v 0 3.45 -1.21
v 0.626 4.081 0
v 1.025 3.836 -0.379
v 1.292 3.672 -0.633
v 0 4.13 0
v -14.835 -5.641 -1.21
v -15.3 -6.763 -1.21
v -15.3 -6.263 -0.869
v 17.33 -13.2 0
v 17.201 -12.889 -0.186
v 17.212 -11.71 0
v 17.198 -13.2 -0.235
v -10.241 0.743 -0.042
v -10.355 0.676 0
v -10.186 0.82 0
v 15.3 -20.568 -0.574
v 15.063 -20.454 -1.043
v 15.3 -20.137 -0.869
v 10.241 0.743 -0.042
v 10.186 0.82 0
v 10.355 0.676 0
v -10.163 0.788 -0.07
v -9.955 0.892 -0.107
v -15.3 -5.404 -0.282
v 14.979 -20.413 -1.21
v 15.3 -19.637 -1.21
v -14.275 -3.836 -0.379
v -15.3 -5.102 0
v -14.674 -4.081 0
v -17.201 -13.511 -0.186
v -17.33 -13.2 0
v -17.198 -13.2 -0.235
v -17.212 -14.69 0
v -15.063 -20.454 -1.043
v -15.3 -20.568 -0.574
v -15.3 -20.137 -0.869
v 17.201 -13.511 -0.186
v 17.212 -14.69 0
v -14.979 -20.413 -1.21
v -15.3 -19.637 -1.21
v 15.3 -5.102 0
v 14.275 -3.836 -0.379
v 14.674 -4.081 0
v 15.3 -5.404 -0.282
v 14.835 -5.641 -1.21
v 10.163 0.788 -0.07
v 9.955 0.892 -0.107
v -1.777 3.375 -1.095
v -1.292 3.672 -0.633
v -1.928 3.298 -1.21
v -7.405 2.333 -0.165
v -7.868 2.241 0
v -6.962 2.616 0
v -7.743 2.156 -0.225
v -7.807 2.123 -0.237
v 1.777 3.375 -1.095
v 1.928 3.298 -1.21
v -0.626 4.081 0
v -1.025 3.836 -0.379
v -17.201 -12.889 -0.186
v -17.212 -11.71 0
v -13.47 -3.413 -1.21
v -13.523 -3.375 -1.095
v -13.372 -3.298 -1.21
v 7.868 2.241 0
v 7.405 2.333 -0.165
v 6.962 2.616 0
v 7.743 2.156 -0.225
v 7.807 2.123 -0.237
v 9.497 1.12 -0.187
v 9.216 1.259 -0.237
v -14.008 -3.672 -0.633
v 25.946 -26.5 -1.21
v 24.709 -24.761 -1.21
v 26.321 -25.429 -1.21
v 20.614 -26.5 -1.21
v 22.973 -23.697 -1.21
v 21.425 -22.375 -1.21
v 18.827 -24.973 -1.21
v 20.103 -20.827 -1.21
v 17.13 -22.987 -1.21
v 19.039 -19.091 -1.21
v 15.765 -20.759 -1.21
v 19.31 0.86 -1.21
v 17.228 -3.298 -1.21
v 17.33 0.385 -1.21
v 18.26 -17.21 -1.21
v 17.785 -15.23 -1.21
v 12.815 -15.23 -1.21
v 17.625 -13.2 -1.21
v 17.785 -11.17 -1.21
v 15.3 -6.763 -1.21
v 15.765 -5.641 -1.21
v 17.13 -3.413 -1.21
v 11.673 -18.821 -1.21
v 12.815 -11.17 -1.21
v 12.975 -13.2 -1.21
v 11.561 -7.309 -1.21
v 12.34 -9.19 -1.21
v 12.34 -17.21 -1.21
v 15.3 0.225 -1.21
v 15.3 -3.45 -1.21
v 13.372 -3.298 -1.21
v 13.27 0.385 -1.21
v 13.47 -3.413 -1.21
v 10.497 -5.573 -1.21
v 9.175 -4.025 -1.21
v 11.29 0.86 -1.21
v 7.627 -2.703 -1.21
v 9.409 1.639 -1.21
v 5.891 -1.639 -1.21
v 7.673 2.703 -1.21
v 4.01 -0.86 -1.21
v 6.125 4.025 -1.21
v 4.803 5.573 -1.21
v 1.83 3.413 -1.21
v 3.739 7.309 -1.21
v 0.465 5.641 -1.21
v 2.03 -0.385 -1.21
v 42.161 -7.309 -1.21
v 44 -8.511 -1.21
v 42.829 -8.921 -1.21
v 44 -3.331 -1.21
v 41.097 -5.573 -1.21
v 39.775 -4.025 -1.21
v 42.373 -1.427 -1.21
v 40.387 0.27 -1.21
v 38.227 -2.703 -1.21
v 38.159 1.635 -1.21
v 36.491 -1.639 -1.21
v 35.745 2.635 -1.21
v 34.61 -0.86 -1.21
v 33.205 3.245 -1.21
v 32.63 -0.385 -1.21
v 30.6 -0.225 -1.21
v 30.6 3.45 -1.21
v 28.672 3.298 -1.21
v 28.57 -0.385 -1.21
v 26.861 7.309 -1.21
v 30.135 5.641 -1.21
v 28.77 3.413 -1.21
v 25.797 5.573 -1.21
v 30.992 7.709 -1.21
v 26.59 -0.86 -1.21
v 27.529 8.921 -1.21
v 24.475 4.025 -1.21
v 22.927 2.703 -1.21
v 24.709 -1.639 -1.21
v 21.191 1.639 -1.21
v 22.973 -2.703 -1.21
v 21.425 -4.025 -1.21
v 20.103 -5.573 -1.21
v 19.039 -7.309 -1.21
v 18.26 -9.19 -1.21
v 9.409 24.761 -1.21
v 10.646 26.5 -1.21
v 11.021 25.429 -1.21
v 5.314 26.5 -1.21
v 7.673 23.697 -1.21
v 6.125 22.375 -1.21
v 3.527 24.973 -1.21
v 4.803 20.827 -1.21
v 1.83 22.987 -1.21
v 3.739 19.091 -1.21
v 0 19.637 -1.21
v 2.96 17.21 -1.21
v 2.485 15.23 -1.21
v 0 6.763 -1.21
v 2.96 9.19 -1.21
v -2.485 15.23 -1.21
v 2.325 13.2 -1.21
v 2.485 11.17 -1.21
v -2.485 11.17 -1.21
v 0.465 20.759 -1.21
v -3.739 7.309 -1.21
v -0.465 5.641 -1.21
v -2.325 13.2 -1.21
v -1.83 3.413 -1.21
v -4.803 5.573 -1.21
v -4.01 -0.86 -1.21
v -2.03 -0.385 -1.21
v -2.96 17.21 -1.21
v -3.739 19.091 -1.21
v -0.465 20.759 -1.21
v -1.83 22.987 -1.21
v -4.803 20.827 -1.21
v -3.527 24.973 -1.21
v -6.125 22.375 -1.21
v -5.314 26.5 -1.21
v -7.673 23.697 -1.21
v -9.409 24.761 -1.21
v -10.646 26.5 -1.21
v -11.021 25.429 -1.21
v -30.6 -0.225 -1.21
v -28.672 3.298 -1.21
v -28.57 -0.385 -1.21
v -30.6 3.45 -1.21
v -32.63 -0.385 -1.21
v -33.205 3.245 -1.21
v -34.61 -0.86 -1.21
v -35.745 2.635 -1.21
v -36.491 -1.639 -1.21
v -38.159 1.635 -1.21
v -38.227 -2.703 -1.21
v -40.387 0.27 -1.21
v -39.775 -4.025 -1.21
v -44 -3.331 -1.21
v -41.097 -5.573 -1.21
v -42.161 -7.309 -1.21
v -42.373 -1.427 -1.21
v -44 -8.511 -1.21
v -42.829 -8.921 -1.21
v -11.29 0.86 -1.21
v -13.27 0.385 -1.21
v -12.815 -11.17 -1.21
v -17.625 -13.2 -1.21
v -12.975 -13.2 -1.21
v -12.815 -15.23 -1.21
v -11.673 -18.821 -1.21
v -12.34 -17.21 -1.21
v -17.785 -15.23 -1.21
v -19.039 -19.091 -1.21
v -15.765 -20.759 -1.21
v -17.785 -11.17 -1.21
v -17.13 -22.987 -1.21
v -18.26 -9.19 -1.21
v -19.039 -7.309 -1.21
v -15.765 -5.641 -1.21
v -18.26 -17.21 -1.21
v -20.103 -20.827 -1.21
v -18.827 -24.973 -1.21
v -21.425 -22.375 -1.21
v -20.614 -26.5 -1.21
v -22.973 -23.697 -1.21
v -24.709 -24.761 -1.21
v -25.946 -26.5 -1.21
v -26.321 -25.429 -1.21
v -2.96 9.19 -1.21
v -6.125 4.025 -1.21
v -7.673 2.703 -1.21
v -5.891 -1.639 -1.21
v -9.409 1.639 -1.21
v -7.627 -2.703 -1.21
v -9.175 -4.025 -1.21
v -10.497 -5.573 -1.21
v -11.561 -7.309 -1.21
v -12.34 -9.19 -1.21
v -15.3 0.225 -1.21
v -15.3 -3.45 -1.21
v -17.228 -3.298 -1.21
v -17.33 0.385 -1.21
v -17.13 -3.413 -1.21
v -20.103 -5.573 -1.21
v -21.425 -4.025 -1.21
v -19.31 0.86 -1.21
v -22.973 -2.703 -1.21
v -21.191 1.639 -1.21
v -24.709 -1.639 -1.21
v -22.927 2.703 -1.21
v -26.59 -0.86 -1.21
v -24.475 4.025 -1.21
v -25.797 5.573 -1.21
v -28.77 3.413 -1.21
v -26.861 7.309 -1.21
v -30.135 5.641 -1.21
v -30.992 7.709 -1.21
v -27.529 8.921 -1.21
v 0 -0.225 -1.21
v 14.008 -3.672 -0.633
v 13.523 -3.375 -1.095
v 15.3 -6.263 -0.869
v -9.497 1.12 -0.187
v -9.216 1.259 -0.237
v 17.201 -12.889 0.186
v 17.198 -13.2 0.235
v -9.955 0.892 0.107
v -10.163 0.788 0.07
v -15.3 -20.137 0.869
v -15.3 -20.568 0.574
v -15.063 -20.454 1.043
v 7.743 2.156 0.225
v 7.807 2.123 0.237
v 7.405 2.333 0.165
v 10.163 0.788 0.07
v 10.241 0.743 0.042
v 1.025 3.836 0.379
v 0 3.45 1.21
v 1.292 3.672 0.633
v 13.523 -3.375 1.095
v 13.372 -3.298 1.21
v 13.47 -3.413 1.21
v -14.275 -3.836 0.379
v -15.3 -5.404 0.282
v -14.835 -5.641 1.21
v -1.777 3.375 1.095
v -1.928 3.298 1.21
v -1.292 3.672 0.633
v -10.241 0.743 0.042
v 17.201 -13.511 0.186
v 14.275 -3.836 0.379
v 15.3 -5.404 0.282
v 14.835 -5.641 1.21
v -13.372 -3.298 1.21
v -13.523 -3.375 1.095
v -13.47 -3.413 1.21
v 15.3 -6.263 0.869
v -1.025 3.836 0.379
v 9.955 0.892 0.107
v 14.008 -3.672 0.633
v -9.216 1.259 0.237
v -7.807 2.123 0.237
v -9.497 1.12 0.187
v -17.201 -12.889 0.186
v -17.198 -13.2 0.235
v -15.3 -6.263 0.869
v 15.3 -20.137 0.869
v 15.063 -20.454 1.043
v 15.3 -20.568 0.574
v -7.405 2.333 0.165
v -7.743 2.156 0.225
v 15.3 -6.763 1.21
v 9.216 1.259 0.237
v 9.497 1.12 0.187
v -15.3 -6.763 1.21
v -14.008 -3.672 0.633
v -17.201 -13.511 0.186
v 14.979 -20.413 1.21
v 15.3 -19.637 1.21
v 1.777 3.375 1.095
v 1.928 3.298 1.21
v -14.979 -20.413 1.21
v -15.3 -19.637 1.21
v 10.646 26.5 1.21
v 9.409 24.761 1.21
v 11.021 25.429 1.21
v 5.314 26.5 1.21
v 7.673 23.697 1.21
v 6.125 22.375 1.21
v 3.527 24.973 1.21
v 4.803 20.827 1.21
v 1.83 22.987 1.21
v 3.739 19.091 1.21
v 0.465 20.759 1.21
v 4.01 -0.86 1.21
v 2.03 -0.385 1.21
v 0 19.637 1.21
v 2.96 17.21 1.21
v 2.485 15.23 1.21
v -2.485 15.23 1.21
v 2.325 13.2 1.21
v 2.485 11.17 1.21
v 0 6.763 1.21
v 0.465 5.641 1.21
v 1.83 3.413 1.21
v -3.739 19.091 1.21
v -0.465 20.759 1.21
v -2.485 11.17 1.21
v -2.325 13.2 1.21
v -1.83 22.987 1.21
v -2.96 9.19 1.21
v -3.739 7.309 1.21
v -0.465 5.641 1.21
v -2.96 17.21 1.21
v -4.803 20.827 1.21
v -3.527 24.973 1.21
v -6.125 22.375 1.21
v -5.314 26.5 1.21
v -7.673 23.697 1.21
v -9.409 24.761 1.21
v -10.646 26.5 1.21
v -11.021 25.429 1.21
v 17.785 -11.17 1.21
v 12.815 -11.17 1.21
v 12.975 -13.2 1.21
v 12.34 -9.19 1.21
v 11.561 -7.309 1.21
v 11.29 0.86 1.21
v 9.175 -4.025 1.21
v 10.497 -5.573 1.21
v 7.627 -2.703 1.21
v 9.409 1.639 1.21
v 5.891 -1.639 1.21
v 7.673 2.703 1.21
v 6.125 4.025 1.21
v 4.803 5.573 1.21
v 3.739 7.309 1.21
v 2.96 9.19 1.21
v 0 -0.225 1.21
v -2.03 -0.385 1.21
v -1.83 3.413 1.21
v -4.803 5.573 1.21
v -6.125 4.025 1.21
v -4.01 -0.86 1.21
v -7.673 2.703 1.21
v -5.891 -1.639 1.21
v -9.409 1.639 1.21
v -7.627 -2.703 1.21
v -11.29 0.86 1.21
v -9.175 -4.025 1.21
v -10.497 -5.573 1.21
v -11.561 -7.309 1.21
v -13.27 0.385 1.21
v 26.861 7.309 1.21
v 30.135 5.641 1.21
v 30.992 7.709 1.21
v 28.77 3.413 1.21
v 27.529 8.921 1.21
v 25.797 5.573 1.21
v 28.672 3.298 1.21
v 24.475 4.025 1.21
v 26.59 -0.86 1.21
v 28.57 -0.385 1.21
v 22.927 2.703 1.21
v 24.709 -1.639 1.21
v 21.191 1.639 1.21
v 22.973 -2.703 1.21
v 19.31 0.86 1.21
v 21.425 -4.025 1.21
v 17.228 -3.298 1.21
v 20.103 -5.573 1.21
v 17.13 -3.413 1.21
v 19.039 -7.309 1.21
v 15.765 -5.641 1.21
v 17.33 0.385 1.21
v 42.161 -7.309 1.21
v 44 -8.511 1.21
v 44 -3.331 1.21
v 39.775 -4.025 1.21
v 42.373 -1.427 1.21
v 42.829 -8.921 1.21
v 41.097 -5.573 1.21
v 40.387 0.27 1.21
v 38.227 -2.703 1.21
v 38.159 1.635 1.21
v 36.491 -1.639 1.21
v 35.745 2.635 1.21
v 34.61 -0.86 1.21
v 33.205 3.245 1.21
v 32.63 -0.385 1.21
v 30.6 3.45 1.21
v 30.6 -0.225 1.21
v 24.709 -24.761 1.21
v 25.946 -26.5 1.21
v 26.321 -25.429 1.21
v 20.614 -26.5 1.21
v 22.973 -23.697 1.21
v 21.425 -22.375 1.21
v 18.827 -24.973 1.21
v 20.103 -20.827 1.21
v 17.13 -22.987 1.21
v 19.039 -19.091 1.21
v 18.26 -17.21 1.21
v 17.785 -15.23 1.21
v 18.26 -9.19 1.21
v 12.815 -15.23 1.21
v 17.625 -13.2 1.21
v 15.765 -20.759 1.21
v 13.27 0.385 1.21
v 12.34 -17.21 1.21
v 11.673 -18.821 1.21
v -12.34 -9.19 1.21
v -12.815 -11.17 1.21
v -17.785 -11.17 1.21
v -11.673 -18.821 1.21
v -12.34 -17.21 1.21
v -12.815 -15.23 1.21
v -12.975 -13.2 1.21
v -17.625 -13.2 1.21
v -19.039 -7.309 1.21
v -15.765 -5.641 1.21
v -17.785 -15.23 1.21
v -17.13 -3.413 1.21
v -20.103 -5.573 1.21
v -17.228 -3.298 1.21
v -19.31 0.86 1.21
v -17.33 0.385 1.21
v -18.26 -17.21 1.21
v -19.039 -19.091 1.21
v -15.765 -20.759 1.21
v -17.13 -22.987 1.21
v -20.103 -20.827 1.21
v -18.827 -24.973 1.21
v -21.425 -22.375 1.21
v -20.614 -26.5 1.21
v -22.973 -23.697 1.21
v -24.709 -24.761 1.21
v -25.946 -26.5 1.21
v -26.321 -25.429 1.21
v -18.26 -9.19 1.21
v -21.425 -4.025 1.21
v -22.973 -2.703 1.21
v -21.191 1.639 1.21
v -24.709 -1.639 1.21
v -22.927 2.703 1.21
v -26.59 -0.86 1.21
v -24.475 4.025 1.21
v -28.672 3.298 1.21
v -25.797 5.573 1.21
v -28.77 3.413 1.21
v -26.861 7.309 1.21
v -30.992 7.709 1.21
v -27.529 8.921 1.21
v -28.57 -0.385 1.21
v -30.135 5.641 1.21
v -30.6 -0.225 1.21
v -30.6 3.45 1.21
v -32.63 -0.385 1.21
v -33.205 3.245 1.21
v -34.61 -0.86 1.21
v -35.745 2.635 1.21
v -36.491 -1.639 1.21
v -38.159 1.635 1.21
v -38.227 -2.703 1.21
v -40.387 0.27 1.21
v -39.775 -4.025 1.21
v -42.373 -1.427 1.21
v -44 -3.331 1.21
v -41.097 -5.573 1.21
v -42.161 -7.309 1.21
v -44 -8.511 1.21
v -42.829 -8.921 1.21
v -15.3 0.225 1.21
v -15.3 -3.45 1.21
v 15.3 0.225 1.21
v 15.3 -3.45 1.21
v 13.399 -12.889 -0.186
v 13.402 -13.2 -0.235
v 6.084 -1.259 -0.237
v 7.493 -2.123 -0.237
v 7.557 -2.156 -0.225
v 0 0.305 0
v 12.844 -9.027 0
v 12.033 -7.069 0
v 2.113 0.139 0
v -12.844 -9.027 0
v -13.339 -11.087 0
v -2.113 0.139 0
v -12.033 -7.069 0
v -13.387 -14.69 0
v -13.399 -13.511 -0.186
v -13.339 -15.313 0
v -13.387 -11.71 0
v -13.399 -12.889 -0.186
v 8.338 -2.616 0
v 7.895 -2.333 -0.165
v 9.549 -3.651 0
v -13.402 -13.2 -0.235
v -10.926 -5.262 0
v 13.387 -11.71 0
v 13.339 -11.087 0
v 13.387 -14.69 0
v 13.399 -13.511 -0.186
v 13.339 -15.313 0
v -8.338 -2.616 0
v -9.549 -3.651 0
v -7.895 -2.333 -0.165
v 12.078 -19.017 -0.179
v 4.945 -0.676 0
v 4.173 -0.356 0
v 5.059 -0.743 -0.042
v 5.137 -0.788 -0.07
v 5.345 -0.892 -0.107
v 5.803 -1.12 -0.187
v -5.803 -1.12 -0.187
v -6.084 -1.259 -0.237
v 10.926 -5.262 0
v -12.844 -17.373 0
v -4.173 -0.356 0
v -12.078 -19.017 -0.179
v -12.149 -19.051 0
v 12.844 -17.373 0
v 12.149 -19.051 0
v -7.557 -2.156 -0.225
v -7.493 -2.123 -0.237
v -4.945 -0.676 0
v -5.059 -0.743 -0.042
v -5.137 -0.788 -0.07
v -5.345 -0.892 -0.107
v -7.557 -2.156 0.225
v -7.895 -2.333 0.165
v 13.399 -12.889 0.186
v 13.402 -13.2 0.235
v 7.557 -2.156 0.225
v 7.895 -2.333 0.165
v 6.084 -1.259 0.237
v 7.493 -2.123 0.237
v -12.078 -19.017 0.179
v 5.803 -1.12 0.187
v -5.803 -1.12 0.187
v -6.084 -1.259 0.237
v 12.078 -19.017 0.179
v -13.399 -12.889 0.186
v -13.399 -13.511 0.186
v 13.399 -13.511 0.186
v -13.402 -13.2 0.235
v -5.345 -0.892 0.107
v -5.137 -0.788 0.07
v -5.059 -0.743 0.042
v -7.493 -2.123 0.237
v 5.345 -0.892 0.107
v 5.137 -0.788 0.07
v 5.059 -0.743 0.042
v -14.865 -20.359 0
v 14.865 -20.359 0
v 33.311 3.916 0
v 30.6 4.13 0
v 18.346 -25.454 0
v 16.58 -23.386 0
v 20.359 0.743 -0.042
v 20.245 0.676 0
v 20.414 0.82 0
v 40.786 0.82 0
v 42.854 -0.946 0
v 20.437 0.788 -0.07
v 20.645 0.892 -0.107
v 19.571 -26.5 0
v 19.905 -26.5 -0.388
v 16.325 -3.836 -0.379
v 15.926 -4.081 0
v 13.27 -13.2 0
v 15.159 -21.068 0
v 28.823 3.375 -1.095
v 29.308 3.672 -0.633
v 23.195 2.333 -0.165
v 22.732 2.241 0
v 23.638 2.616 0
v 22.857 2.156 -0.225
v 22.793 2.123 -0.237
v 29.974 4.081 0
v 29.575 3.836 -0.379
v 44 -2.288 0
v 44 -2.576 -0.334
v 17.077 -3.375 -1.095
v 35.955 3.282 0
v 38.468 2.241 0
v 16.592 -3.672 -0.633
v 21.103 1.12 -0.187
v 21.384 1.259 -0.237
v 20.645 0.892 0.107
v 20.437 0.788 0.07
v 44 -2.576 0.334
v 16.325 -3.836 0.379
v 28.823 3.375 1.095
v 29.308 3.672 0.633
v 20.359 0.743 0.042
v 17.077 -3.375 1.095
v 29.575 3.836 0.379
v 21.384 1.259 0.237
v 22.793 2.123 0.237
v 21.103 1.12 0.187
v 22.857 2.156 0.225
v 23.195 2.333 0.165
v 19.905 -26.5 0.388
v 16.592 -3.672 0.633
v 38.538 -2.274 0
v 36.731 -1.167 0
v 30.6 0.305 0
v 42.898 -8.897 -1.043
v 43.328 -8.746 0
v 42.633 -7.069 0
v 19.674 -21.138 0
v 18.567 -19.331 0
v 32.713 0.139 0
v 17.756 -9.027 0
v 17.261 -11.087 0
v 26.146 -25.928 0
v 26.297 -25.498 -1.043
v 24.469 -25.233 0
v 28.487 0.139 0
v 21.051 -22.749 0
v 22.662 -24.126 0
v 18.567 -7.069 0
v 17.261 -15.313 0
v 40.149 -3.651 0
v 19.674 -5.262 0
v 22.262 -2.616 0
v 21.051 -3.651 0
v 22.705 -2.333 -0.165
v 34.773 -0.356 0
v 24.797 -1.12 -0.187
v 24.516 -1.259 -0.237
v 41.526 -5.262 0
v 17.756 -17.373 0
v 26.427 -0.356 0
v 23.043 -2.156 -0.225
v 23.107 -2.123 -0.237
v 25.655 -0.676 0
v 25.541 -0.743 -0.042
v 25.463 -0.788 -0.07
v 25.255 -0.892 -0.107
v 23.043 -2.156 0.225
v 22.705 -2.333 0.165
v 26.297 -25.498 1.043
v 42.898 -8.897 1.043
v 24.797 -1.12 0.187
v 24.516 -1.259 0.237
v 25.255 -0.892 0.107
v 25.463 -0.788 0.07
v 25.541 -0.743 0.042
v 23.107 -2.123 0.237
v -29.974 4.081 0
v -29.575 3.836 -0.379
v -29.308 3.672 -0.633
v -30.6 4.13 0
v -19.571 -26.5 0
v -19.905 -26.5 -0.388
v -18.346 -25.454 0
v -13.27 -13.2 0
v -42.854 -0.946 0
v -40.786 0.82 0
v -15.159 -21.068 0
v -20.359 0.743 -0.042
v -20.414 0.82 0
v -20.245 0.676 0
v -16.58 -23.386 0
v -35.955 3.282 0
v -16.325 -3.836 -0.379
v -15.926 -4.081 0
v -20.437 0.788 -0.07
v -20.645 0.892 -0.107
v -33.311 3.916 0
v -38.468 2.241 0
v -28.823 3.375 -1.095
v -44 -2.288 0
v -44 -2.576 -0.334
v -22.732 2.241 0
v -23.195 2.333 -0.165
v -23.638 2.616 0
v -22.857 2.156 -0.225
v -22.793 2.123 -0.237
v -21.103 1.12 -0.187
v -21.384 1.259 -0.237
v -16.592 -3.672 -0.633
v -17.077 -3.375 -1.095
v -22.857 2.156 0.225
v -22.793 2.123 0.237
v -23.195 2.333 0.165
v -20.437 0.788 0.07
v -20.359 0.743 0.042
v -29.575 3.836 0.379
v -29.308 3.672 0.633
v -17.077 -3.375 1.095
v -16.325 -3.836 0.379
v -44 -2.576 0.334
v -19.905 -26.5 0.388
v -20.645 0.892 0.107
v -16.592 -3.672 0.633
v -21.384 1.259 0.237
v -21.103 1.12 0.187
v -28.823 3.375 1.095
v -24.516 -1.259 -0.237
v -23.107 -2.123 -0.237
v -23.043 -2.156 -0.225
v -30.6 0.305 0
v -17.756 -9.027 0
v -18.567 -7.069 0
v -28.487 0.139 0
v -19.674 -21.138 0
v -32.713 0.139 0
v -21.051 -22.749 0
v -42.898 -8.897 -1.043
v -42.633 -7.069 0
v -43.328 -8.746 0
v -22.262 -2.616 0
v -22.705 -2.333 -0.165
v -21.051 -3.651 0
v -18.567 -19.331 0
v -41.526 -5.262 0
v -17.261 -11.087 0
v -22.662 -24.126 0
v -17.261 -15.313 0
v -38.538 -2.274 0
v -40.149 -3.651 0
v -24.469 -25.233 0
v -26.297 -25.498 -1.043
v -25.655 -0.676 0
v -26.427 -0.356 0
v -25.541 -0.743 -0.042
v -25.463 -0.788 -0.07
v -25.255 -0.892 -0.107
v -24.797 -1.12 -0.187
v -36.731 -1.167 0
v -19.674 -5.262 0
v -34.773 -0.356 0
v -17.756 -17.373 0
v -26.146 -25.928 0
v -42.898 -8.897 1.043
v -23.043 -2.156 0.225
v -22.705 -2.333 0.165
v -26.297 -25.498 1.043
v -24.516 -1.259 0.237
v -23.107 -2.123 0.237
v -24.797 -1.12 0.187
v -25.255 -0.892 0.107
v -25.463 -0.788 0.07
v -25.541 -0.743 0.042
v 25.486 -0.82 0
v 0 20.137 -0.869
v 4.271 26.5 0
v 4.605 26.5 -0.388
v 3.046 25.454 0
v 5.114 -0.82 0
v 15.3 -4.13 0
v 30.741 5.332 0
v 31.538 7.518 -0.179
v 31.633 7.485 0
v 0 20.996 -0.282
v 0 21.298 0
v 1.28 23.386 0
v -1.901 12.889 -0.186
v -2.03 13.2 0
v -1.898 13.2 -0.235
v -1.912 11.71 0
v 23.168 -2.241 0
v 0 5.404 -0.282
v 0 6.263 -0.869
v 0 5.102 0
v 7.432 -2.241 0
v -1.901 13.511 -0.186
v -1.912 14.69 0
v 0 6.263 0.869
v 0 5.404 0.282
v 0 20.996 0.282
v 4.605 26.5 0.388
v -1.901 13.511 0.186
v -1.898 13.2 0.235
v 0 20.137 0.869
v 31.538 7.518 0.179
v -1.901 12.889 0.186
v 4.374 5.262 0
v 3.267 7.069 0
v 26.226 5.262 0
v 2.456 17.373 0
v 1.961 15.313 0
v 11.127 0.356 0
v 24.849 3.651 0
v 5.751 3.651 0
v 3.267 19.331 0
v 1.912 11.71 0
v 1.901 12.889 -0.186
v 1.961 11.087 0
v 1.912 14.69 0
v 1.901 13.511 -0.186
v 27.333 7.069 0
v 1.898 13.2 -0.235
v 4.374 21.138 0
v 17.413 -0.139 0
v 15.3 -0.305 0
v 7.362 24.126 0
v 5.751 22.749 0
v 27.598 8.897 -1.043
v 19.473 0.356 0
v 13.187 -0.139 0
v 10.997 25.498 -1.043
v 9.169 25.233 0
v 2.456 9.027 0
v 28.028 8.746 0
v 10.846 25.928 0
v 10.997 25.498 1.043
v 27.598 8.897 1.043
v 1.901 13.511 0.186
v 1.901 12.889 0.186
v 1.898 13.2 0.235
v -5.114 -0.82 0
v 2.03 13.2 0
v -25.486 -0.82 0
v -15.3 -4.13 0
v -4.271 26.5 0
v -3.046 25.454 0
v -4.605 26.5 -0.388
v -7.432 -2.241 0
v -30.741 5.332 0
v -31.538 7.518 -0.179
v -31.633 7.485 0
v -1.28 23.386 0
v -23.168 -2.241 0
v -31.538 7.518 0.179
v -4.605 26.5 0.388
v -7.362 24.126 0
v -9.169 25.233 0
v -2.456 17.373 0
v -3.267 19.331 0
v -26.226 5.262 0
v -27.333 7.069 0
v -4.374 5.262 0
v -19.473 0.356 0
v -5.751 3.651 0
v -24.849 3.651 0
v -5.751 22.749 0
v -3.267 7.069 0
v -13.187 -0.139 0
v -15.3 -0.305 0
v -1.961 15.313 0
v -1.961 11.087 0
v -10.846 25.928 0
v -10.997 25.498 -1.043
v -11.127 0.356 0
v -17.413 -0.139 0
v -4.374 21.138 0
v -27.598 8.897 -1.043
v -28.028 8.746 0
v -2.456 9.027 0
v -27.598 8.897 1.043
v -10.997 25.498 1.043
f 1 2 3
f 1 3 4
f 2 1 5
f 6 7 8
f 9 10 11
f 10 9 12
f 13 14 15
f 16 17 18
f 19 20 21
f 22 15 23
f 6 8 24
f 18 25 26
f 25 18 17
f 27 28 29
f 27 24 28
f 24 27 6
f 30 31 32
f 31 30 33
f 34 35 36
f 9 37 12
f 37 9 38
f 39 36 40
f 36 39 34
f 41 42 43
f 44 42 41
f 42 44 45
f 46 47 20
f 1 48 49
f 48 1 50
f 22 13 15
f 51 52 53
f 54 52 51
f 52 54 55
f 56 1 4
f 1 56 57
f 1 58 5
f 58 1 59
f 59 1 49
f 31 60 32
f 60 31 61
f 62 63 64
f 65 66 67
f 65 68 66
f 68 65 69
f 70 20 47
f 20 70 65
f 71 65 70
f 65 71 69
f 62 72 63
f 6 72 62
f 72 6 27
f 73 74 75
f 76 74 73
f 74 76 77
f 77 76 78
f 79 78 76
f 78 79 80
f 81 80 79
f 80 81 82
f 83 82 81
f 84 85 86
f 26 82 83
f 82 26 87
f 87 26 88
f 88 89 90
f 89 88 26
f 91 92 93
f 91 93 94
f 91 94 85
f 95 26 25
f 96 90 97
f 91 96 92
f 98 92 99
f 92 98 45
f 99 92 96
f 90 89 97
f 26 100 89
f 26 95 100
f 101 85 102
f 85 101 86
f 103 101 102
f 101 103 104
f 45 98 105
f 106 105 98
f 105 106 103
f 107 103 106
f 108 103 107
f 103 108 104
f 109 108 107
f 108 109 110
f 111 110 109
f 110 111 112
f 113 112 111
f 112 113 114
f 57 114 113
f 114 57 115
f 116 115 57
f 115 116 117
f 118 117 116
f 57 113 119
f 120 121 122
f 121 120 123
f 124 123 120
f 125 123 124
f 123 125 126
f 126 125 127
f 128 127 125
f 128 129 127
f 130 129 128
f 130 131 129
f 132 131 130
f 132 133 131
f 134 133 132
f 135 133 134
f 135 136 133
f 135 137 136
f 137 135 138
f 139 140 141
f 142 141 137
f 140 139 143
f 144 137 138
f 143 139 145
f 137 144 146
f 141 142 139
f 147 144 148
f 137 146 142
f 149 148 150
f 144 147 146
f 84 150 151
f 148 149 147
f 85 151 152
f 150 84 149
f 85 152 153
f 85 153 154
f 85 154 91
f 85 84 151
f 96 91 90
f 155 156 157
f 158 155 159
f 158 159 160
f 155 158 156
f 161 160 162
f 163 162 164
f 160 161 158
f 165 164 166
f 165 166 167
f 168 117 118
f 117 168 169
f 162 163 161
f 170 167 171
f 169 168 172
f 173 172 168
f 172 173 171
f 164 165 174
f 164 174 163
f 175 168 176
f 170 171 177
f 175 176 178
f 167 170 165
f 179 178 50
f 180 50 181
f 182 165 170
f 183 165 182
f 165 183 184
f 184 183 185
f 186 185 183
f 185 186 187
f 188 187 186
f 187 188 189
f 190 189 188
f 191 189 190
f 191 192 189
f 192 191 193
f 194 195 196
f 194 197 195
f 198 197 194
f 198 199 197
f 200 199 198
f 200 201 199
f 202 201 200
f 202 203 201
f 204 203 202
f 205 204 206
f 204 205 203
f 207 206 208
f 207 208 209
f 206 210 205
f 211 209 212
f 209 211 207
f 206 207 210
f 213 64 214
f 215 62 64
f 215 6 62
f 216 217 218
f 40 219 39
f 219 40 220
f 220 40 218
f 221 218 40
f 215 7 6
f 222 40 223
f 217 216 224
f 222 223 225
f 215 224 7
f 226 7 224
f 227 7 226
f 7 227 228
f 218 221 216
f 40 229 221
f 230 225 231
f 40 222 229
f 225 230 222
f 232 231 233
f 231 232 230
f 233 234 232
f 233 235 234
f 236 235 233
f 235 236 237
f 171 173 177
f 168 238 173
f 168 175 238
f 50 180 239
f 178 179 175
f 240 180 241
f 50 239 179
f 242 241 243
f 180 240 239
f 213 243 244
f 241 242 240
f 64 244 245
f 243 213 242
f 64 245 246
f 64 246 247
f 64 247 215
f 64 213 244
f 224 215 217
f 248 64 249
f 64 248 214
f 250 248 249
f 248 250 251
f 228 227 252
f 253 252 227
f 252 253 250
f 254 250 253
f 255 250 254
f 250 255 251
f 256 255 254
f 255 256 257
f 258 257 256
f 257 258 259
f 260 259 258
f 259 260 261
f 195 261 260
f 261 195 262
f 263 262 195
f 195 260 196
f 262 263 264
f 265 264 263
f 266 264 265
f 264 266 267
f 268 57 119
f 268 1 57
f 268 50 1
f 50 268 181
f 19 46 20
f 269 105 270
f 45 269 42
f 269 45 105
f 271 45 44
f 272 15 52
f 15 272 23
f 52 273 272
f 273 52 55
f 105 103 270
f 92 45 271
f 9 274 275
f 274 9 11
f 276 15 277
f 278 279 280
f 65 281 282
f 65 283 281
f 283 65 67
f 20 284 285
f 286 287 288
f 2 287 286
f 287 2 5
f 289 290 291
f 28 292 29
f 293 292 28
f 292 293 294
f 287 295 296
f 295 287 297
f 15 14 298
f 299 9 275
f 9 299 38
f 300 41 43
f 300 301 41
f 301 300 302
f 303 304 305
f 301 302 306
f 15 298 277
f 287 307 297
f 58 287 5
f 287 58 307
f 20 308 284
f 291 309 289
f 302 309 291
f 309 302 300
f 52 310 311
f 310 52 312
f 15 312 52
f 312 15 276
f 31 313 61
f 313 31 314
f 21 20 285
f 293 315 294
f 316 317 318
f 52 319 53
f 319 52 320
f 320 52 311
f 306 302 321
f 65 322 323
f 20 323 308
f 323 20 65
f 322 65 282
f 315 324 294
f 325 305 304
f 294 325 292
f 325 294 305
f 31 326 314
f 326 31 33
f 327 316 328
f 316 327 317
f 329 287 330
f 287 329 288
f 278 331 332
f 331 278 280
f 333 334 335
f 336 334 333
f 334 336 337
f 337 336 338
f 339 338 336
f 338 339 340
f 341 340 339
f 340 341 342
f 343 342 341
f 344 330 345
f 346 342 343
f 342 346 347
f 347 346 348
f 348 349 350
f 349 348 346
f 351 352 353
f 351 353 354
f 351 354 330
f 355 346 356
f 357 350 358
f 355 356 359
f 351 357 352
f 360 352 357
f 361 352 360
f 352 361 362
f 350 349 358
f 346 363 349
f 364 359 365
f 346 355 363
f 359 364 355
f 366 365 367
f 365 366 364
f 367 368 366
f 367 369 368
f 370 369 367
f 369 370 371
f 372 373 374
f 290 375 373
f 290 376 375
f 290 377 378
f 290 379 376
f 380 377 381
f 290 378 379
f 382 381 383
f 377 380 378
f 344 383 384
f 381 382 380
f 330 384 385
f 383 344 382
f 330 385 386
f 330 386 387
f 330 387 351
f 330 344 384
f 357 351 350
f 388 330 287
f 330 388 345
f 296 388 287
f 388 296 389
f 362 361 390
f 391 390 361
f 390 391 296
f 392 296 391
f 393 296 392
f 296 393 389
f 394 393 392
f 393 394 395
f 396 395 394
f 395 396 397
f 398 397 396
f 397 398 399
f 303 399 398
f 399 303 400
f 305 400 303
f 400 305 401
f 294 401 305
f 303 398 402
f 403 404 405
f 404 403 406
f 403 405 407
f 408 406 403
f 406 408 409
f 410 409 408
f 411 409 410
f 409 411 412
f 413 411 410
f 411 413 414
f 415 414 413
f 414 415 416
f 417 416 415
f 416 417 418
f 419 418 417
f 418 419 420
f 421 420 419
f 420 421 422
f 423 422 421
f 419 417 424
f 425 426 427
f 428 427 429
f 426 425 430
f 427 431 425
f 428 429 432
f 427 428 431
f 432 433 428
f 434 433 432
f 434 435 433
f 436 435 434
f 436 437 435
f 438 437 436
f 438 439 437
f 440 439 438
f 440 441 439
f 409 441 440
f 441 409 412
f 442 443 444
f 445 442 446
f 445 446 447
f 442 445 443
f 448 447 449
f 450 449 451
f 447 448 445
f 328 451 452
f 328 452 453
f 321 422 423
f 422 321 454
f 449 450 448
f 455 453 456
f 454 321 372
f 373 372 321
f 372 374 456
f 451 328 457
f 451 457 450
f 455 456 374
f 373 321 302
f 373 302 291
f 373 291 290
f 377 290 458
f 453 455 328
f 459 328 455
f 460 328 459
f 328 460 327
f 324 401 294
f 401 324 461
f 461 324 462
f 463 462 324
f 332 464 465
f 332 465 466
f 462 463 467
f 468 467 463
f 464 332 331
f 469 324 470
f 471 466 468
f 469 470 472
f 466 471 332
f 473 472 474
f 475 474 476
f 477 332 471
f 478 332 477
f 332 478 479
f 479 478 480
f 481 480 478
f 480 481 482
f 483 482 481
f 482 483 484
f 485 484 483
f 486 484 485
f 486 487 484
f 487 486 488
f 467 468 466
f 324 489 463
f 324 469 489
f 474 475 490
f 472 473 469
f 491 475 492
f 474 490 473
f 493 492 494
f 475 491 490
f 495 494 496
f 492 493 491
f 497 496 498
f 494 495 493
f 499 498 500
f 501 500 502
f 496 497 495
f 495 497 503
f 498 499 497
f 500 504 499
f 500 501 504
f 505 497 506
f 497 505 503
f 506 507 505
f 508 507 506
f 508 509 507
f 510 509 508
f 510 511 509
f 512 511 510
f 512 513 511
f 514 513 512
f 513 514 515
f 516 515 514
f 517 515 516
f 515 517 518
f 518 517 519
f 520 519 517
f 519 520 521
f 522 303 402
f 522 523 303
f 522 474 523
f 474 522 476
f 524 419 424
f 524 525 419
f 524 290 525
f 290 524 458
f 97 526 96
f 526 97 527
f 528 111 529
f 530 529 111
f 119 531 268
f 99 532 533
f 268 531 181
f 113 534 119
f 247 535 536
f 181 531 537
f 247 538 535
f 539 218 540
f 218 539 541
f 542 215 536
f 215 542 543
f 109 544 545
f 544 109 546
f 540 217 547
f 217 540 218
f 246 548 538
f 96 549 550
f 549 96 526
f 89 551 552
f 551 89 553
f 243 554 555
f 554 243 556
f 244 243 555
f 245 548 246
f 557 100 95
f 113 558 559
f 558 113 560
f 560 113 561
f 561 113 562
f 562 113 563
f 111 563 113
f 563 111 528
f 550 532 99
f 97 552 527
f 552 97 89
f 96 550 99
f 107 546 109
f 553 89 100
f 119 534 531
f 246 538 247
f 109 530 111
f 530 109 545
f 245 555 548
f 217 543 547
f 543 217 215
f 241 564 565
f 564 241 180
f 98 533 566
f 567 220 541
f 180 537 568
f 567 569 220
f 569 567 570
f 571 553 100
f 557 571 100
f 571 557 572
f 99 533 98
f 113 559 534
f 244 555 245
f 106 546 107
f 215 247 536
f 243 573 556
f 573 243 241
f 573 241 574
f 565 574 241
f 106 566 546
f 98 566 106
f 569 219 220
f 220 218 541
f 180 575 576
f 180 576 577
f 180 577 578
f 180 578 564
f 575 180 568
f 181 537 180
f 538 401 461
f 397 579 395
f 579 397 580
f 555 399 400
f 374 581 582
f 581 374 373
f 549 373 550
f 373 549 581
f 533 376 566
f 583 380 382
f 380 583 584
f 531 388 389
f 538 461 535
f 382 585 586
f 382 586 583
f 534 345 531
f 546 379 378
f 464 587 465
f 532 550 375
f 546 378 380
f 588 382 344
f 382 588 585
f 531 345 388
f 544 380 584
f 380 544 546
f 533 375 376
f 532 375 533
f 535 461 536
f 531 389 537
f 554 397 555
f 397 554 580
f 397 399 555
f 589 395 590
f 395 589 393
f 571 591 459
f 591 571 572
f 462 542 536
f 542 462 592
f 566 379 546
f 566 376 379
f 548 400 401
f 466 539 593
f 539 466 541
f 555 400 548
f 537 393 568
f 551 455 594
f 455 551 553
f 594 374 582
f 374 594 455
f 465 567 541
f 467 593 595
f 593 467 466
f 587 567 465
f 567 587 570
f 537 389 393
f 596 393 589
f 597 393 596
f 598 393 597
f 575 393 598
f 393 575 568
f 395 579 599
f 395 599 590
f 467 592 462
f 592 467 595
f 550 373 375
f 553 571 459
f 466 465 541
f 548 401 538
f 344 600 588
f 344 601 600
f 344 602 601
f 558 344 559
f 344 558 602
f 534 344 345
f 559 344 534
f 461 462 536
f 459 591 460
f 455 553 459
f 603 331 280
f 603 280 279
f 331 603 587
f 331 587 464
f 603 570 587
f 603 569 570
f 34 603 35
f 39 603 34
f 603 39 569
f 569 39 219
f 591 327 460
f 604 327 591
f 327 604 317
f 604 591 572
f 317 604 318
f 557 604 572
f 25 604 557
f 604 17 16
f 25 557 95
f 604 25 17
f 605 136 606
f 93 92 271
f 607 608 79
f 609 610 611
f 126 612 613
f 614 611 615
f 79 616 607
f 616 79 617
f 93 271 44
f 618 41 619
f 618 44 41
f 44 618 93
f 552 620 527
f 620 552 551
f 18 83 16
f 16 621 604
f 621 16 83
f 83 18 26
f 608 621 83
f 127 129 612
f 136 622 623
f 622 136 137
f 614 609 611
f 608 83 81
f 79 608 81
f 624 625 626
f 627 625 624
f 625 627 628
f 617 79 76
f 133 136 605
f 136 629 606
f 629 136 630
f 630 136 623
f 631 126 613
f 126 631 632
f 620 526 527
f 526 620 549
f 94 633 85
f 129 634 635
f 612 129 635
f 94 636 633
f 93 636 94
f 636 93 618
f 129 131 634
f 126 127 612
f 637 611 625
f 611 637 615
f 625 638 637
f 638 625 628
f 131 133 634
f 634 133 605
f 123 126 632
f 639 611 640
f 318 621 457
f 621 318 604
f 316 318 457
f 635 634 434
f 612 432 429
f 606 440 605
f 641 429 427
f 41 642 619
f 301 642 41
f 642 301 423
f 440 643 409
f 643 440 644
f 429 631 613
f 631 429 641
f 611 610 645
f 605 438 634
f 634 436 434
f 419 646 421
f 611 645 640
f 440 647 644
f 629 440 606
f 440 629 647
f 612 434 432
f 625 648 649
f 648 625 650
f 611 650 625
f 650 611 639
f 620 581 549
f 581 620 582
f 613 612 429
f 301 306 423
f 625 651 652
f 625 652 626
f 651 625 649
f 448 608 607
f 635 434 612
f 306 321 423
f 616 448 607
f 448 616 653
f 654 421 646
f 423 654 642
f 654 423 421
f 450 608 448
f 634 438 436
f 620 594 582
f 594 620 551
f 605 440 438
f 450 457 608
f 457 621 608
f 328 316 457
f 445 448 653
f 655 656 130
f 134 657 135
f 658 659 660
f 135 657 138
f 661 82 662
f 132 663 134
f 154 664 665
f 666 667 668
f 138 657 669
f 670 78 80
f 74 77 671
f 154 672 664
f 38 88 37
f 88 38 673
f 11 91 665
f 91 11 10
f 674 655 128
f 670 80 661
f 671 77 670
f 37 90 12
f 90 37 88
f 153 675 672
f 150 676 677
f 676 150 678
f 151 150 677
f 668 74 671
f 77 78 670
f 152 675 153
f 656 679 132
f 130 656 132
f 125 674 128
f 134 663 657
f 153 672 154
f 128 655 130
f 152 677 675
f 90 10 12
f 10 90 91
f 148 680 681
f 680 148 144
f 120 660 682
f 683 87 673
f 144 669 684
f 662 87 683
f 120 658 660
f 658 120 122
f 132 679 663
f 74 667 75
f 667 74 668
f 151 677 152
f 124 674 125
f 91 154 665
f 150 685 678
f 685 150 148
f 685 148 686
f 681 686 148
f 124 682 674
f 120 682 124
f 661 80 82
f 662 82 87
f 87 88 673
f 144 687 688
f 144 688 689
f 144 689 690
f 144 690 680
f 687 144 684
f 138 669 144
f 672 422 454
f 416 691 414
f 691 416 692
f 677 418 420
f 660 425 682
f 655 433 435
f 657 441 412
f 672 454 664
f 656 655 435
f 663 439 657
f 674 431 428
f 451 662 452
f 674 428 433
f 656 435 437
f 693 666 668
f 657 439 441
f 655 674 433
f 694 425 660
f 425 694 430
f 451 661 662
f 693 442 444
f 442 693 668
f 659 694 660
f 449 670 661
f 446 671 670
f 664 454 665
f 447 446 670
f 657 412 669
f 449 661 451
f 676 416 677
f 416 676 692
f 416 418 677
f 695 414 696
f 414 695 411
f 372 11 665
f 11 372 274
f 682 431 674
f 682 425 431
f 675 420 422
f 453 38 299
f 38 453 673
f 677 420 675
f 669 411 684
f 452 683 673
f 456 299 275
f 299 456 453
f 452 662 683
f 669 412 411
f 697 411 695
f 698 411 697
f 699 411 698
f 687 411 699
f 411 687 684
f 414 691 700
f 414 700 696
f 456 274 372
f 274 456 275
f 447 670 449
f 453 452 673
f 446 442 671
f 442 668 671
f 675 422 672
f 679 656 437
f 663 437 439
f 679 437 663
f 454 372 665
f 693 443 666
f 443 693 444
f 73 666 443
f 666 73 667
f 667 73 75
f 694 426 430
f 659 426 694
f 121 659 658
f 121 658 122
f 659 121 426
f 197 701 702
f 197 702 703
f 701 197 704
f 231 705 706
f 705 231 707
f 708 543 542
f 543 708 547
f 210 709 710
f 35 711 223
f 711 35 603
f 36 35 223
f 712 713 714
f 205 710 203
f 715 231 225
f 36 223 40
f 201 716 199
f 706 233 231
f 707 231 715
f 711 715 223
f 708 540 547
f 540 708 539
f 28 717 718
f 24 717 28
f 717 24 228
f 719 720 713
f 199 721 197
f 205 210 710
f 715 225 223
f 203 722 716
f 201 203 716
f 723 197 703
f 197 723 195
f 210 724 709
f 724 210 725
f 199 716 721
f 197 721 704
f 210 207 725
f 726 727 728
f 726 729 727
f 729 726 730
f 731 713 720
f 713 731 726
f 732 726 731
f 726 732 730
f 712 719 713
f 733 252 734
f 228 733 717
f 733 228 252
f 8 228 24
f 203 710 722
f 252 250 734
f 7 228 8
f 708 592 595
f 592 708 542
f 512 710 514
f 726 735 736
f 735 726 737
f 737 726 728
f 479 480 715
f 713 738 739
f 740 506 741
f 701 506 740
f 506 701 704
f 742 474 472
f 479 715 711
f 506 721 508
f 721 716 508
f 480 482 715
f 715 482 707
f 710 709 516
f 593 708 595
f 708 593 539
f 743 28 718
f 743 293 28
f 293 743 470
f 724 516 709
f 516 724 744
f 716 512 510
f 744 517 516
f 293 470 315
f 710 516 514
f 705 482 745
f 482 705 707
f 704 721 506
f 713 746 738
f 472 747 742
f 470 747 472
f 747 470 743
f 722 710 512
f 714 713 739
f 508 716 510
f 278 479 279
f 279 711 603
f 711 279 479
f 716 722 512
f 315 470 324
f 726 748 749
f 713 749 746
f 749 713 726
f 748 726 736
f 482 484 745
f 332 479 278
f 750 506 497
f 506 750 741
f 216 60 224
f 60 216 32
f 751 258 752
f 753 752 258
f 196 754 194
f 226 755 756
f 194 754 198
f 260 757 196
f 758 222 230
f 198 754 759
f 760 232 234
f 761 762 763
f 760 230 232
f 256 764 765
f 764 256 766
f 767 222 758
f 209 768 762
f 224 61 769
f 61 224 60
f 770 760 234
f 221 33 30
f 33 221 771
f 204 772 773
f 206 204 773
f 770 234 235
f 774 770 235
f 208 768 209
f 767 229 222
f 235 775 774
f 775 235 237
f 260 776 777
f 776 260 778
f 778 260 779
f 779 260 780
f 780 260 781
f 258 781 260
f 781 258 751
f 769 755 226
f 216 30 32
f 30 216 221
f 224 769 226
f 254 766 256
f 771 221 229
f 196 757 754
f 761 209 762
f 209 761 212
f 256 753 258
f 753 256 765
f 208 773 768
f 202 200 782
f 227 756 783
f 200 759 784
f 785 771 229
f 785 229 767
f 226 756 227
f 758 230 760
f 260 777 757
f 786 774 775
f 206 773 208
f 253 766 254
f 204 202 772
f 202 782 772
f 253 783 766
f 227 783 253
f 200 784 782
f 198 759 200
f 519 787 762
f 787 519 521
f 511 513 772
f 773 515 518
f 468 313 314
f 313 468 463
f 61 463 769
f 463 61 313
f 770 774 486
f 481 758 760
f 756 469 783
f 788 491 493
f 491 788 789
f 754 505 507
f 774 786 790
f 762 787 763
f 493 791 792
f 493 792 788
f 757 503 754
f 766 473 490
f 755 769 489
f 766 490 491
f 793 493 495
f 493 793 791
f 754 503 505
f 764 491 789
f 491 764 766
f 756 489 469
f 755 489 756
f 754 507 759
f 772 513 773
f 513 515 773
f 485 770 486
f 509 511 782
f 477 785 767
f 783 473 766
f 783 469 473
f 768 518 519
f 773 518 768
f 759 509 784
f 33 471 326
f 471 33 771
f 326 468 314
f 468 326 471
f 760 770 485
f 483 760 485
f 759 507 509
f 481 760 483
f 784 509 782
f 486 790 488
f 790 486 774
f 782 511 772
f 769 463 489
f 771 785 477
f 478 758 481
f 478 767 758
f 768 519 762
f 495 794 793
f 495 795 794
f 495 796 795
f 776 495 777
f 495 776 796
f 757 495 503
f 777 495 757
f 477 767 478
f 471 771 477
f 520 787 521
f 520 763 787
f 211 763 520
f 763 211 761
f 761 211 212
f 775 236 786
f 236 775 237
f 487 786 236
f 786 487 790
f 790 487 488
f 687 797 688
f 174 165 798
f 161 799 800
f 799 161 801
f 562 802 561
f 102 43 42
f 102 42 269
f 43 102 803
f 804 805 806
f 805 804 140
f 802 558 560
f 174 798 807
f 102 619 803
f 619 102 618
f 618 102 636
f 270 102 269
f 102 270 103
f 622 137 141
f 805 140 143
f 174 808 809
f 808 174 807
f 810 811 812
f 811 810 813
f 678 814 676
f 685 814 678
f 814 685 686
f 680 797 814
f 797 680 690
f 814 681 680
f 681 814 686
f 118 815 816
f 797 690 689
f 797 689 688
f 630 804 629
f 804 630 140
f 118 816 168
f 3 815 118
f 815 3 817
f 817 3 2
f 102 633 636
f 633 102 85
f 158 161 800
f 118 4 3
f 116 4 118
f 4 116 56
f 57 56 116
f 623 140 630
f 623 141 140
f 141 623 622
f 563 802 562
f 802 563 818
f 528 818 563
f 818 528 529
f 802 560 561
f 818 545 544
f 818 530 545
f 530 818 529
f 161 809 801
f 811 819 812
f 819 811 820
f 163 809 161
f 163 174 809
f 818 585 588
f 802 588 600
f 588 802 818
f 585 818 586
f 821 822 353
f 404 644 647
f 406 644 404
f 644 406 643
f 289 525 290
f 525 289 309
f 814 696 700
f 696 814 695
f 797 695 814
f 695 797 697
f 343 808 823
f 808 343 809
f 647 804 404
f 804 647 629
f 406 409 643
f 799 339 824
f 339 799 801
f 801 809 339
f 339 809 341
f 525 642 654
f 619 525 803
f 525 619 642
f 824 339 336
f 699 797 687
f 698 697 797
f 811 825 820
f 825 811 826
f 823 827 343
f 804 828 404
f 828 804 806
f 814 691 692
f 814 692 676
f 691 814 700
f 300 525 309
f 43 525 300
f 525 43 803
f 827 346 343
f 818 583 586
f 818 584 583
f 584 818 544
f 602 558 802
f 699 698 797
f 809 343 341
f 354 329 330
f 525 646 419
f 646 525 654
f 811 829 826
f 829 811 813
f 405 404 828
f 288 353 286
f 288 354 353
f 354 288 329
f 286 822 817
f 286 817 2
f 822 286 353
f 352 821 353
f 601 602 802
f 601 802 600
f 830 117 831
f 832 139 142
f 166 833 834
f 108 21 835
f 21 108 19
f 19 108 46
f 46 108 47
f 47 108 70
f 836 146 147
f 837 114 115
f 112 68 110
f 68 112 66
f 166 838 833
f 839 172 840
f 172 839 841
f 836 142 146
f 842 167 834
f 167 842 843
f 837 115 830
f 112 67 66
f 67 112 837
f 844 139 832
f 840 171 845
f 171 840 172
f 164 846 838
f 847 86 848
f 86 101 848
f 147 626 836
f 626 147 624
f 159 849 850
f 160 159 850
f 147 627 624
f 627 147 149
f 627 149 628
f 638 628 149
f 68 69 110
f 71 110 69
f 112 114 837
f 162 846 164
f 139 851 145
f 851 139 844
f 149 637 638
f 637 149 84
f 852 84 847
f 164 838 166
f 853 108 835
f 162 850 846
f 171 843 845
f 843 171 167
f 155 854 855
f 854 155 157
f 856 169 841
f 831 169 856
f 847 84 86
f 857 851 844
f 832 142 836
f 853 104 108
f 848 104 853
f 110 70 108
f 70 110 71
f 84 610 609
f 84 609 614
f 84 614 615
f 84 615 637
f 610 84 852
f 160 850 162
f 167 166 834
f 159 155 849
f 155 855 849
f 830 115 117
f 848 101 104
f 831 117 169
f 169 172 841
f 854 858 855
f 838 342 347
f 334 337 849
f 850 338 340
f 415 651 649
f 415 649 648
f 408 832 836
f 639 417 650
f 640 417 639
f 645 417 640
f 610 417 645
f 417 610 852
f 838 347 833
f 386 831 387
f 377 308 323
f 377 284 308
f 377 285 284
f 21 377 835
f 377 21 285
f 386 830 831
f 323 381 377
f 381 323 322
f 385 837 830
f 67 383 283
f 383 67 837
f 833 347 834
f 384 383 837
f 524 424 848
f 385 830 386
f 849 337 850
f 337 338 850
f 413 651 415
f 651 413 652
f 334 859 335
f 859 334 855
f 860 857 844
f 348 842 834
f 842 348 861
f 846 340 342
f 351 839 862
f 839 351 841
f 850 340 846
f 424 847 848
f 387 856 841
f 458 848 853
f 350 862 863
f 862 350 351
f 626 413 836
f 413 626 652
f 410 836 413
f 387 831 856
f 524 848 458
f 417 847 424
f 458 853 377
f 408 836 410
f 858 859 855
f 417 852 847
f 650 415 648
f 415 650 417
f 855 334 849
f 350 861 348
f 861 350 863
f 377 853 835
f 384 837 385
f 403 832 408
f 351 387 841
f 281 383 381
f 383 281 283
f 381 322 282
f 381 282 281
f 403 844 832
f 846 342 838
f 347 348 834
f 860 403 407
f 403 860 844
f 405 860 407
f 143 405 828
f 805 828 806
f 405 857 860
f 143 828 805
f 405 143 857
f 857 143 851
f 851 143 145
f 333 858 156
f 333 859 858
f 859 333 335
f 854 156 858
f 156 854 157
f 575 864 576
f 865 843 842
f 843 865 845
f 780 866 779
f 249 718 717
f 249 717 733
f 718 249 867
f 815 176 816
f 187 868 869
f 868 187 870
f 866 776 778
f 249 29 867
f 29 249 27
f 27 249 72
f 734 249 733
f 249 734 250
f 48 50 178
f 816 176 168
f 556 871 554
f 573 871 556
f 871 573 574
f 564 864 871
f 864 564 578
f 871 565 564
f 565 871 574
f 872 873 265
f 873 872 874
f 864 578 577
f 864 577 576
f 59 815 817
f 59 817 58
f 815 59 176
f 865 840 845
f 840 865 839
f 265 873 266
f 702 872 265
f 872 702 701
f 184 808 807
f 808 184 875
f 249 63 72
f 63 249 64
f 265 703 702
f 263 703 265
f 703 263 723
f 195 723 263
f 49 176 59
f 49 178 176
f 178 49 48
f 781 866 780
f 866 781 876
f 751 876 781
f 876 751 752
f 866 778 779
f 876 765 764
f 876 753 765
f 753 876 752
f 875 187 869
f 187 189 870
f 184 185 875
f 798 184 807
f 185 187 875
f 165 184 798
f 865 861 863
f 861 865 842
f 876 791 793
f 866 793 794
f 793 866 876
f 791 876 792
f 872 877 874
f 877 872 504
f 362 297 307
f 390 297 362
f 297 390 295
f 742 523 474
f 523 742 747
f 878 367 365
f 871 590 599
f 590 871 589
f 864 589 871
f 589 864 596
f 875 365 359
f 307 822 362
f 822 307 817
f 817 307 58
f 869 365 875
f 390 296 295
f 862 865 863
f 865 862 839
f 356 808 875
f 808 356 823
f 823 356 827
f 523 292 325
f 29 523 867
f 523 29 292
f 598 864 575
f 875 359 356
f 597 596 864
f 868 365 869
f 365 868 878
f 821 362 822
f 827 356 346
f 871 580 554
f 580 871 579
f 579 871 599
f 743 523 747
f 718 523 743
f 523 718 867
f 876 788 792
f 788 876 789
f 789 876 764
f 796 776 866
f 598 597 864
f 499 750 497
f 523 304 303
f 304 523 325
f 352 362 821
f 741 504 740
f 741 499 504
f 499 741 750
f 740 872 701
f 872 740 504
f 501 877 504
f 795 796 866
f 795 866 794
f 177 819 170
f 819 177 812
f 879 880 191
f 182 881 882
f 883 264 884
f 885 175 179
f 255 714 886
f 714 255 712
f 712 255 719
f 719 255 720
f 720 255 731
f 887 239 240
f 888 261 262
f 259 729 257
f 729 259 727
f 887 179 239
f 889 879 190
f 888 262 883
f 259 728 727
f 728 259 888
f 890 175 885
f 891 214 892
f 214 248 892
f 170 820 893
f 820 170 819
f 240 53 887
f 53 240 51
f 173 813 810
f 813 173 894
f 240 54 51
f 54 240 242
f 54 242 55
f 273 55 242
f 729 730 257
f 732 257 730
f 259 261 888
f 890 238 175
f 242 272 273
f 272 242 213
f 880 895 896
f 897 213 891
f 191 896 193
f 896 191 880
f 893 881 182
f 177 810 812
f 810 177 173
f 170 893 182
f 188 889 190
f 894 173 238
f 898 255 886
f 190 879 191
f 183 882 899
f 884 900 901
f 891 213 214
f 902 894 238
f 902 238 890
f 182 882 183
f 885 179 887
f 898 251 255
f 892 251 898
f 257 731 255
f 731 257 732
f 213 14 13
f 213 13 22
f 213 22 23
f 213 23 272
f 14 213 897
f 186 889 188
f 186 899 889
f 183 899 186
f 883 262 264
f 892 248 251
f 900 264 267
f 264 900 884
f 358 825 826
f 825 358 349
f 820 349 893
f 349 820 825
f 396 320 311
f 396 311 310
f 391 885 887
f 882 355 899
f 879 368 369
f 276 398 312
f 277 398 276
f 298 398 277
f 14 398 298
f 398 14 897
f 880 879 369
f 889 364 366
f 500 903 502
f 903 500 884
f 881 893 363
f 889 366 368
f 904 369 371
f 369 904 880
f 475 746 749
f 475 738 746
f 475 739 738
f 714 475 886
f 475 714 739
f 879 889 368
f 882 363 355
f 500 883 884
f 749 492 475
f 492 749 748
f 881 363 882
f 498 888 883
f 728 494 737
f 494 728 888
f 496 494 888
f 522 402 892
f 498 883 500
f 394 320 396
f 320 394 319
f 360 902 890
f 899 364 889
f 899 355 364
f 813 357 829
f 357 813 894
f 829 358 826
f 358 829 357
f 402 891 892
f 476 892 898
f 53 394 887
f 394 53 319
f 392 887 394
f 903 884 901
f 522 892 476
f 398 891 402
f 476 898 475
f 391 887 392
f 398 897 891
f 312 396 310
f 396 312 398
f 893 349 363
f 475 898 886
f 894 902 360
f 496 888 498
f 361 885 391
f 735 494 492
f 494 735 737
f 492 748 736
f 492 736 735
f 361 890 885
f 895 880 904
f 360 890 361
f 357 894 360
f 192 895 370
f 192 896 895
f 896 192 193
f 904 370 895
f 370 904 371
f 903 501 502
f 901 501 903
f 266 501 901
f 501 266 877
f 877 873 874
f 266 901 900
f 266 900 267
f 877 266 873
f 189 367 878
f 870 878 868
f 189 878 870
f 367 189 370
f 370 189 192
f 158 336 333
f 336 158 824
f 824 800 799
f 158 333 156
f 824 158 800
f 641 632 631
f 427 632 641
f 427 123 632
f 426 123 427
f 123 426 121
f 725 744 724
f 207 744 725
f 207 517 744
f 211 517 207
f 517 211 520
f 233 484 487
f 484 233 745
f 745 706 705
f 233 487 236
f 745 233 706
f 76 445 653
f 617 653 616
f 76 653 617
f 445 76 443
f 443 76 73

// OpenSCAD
Length=88; //Credit Card Size
Width=53; //Credit Card Size
NDia=21.19; //Canadian Nickle Diameter
NThick=1.81; //Canadian Nickle Thickness
DDia=18.01; //Canadian Dime Thickness
DThick=1.19; //Canadian Dime Thickness
QDia=23.88; //Canadian Quarter Thickness
QThick=1.58; //Canadian Quarter Thickness
LDia=26.48; //Canadian Loonie Diameter
LThick=1.92; //Candian Loonie Thickness
TDia=27.94; //Candian Toonie Diameter
TThick=1.67; //Candian Toonie Thickness
WallWidth=3.75; //Hub Thickness for flexibimty and strength
Thickness=LThick+0.5; //0.5mm thicker than thickest coin
$fn=40;


module CoinHole(Diameter){
	translate([0,0,-Thickness/2])cylinder(r1=Diameter*0.49,r2=Diameter*.51,h=Thickness/2);
	translate([0,0,0])cylinder(r1=Diameter*0.51,r2=Diameter*.49,h=Thickness/2);
	cylinder(r=Diameter*.49,h=Thickness*2,center=true);
}
module OutCoinHole(Diameter){
	translate([0,0,-Thickness/2])cylinder(r1=Diameter*0.49,r2=Diameter*.51,h=Thickness/2);
	translate([0,0,0])cylinder(r1=Diameter*0.51,r2=Diameter*.49,h=Thickness/2);
	//cylinder(r=Diameter*.49,h=Thickness*2,center=true);
}
module CutOut(Size){
	translate([-Size,0,-Thickness])cylinder(r=Size,h=Thickness*2,$fn=7,center=false);
}
module CoinCircle(XLoc,YLoc,Diameter,Rot){
	difference(){
		translate([XLoc,YLoc,0])OutCoinHole(Diameter+WallWidth*2); //Outside Circle
		translate([XLoc,YLoc,0])CoinHole(Diameter); //Inside Circle
		translate([XLoc,YLoc,0])rotate(a=[0,0,Rot])CutOut(Diameter); //Stress Notch
	}
}

intersection(){
	union(){
		CoinCircle(0,-13.2,LDia,90); //Loonie 1
		CoinCircle(30.6,-13.2,LDia,135); //Loonie 2
		CoinCircle(-30.6,-13.2,LDia,45); //Loonie 3
		CoinCircle(15.3,13.2,LDia,-135); //Loonie 4
		CoinCircle(-15.3,13.2,LDia,-45); //Loonie 5
	}
	minkowski(){
			cube([Length-4,Width-4,Thickness],center=true);
			cylinder(r=2,h=Thickness/2,center=true);
	}
}
